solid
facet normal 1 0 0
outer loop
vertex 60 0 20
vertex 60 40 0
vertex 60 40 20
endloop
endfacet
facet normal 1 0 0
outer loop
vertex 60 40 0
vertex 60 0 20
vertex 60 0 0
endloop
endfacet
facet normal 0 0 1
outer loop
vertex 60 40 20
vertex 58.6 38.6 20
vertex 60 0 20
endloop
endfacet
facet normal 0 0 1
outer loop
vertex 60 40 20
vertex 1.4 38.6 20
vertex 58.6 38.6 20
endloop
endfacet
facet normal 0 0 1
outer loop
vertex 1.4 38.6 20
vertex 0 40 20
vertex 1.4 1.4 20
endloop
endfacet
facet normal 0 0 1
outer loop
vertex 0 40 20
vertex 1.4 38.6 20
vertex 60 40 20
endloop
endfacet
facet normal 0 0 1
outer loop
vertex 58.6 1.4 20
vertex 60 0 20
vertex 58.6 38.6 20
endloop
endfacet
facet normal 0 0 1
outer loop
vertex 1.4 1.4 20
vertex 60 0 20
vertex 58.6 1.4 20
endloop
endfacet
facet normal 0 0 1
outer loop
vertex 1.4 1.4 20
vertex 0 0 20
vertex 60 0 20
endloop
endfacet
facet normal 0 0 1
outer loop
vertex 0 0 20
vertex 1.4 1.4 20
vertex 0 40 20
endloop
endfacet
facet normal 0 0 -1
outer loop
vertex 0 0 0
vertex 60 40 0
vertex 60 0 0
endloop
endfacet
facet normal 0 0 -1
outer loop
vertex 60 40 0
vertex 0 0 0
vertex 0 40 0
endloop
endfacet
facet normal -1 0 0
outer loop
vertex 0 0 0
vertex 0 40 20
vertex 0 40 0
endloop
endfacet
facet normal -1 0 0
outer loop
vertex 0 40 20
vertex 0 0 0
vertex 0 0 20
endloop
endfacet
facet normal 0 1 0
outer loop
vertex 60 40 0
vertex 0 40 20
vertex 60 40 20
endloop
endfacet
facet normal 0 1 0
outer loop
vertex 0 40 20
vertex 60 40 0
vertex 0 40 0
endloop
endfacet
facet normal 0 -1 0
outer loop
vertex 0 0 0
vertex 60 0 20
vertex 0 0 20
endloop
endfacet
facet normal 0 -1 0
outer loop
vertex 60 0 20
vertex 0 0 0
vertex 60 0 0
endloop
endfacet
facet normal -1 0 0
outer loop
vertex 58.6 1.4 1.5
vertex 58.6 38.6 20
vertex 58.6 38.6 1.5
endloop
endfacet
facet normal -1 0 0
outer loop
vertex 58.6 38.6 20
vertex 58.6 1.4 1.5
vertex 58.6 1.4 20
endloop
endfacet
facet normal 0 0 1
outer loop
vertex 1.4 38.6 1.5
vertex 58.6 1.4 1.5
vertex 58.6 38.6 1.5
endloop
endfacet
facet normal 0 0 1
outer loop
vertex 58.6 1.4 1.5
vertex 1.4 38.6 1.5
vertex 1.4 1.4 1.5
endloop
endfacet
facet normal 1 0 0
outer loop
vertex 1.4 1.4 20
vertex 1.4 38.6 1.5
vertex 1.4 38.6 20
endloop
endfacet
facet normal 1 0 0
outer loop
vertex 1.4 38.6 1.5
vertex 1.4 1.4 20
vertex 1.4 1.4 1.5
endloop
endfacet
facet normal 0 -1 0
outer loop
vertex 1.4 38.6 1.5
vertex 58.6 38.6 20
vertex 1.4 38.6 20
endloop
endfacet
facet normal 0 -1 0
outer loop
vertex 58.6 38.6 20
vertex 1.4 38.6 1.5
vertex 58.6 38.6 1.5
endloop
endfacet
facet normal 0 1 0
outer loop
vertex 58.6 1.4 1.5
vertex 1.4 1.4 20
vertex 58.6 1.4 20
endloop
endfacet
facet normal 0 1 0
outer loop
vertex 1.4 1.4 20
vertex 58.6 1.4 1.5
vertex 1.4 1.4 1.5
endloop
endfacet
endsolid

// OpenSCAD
$fn = 32;

// ----------------------------------------------------------------------
// Open box: 1.4 mm walls
// ----------------------------------------------------------------------

// --- parameters (mm) ---
box_l = 60;               // outer length, X
box_w = 40;               // outer width, Y
box_h = 20;               // outer height, Z
wall = 1.4;               // wall thickness
floor = 1.5;              // floor thickness

difference() {
  cube([box_l, box_w, box_h]);
  translate([wall, wall, floor])
    cube([box_l - 2 * wall, box_w - 2 * wall, box_h]);
}
